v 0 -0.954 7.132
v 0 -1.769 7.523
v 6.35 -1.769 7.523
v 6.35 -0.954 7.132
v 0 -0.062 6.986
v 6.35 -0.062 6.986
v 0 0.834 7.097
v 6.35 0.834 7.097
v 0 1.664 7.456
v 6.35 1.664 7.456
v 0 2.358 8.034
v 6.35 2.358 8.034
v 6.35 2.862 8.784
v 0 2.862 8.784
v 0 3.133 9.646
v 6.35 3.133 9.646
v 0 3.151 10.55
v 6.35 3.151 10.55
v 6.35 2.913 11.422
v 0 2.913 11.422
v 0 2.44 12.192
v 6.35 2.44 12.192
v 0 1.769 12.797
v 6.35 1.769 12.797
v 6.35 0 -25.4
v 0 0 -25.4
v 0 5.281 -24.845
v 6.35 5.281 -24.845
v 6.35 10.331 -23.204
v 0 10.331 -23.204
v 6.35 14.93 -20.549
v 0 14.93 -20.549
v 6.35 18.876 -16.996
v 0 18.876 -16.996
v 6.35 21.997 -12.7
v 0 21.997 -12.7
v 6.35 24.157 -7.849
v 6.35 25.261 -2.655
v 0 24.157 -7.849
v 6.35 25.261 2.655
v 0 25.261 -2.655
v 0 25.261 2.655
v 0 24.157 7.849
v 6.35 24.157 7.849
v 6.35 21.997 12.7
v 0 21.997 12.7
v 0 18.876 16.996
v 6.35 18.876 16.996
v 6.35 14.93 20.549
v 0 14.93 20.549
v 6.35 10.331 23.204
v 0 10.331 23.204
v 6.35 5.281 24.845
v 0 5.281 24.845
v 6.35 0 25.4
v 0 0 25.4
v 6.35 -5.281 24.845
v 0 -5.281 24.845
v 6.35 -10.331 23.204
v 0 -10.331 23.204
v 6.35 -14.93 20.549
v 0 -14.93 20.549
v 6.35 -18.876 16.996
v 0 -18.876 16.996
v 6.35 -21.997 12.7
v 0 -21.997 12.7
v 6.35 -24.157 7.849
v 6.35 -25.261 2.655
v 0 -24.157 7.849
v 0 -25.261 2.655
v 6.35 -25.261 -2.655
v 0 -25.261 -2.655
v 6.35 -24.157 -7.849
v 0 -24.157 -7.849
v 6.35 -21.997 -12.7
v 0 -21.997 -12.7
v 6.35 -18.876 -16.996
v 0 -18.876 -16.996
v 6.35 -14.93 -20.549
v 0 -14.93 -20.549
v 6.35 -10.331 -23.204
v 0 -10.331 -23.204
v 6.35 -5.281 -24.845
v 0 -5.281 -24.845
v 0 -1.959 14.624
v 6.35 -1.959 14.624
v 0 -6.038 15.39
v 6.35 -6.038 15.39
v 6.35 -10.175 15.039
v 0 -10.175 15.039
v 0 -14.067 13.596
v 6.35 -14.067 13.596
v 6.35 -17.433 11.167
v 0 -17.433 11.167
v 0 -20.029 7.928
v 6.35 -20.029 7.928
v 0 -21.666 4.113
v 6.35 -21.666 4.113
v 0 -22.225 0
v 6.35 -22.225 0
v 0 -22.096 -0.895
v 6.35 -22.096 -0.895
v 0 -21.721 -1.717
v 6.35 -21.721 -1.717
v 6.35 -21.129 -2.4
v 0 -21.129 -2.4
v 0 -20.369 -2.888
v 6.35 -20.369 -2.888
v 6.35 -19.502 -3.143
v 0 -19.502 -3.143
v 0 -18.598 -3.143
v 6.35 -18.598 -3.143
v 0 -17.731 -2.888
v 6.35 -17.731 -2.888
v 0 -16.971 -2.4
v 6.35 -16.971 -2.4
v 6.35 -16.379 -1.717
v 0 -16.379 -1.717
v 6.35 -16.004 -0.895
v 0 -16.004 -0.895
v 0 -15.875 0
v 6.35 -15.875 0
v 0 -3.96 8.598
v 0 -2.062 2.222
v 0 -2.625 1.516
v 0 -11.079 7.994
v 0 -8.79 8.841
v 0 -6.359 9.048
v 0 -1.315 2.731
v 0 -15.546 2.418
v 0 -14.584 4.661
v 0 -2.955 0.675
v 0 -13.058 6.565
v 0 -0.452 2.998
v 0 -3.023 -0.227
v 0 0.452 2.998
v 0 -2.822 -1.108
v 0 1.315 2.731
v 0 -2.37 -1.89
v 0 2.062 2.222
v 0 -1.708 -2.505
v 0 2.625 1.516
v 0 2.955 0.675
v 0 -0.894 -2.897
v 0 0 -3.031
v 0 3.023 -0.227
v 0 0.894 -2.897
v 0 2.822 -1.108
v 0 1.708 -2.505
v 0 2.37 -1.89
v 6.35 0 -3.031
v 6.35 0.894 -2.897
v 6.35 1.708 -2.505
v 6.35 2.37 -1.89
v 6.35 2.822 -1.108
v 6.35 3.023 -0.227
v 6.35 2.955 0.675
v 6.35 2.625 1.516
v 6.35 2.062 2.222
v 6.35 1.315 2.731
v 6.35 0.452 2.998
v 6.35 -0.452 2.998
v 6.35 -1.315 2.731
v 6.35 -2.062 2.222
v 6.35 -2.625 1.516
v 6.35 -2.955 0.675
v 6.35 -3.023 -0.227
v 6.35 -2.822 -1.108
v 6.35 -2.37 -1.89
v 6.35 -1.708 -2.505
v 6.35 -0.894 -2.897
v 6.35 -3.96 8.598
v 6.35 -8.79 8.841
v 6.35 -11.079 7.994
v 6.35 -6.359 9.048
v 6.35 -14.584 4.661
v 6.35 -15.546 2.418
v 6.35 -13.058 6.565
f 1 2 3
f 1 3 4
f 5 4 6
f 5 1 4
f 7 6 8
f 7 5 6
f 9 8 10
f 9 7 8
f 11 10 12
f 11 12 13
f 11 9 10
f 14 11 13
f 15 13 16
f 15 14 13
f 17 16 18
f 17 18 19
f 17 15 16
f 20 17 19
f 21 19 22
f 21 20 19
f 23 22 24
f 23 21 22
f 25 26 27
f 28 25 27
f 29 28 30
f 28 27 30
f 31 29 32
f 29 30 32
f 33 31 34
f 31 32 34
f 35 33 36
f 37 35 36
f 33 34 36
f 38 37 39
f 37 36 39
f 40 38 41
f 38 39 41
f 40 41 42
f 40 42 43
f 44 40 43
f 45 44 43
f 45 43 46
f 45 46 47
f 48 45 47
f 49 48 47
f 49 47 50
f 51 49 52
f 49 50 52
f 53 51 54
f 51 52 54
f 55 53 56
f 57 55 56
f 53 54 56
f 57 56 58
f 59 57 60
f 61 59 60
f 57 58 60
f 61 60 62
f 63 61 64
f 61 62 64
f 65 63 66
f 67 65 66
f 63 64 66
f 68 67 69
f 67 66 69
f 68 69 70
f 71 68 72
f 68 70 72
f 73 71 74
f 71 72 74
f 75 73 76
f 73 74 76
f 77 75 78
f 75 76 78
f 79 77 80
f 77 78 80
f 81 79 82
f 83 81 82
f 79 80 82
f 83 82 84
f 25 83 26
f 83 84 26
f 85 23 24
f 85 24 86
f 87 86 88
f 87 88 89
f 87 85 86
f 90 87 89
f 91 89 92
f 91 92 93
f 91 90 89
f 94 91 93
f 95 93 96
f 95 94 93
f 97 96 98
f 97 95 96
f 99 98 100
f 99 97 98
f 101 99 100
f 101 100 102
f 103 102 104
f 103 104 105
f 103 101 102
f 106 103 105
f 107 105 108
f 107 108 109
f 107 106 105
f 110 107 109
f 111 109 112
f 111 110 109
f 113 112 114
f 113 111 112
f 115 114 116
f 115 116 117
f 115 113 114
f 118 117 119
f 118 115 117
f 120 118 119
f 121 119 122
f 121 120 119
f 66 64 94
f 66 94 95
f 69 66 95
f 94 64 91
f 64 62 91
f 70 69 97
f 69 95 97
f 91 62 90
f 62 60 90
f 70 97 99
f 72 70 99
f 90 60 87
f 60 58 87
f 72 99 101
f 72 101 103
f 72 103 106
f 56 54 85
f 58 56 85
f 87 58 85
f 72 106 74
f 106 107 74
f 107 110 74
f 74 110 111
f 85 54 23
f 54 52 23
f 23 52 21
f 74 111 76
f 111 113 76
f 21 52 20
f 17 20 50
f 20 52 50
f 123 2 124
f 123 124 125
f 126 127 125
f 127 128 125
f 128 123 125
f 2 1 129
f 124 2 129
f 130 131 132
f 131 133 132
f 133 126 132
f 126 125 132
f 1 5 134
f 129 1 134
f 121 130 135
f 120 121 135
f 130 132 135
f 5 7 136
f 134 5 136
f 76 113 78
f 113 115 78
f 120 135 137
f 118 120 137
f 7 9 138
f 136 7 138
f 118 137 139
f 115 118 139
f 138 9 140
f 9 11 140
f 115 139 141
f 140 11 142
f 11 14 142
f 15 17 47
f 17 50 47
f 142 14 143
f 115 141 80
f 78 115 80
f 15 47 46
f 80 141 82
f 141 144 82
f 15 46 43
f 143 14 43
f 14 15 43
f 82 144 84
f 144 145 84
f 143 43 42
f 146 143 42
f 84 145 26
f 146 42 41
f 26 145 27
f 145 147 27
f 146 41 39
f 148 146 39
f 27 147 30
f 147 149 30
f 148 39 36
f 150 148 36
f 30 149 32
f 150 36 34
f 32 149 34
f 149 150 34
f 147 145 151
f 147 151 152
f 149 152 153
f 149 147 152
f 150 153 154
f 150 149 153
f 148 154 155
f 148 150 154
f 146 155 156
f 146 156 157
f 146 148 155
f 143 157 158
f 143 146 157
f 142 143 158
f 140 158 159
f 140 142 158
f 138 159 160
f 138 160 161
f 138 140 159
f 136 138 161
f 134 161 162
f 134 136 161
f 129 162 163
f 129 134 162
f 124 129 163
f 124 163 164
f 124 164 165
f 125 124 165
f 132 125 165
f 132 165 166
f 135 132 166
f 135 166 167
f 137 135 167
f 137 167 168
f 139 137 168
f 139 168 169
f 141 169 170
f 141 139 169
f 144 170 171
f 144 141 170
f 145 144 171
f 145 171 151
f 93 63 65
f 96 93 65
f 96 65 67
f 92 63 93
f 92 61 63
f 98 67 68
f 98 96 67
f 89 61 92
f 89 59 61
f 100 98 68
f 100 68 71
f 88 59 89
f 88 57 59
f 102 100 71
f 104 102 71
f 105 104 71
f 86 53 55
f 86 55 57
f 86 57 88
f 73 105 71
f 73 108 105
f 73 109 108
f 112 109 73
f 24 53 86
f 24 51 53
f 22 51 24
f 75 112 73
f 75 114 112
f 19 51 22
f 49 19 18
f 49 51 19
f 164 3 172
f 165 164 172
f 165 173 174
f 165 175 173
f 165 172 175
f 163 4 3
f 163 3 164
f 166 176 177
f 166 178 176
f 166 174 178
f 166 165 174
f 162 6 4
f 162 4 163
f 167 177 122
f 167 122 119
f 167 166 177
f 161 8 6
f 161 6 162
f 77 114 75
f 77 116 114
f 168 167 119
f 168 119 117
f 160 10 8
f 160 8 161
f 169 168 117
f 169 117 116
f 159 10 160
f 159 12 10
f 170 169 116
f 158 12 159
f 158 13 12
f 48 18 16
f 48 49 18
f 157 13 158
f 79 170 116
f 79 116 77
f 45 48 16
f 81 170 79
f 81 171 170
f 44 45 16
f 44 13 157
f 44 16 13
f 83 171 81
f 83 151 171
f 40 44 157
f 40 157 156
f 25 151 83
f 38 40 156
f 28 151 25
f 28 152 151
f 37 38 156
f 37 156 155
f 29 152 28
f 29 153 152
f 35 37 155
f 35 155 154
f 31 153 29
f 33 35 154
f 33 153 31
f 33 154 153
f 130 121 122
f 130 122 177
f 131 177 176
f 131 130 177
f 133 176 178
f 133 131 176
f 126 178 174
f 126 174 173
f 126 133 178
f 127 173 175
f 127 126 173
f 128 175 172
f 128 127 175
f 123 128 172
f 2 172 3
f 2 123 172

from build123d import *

# Parameters (mm, degrees)
SKETCH1_R           = 25.4
SKETCH1_R_2         = 3.031432634
BOSS_EXTRUDE1_DEPTH = 6.35


with BuildPart() as part:
    # Sketch1 → Boss-Extrude1 (new body)
    with BuildSketch(Plane(origin=(0, 0, 0), x_dir=(0, 0, -1), z_dir=(1, 0, 0))):
        Circle(SKETCH1_R)
        Circle(SKETCH1_R_2, mode=Mode.SUBTRACT)
        with BuildLine():
            ThreePointArc((-12.796678201, 1.768771626), (-13.596470588, -14.067117647), (0, -22.225))
            ThreePointArc((0, -22.225), (3.175, -19.05), (0, -15.875))
            ThreePointArc((0, -15.875), (-7.993529412, -11.078882353), (-7.523321799, -1.768771626))
            ThreePointArc((-7.523321799, -1.768771626), (-8.391228374, 2.636678201), (-12.796678201, 1.768771626))
        make_face(mode=Mode.SUBTRACT)
    extrude(amount=BOSS_EXTRUDE1_DEPTH)


solid = part.part
